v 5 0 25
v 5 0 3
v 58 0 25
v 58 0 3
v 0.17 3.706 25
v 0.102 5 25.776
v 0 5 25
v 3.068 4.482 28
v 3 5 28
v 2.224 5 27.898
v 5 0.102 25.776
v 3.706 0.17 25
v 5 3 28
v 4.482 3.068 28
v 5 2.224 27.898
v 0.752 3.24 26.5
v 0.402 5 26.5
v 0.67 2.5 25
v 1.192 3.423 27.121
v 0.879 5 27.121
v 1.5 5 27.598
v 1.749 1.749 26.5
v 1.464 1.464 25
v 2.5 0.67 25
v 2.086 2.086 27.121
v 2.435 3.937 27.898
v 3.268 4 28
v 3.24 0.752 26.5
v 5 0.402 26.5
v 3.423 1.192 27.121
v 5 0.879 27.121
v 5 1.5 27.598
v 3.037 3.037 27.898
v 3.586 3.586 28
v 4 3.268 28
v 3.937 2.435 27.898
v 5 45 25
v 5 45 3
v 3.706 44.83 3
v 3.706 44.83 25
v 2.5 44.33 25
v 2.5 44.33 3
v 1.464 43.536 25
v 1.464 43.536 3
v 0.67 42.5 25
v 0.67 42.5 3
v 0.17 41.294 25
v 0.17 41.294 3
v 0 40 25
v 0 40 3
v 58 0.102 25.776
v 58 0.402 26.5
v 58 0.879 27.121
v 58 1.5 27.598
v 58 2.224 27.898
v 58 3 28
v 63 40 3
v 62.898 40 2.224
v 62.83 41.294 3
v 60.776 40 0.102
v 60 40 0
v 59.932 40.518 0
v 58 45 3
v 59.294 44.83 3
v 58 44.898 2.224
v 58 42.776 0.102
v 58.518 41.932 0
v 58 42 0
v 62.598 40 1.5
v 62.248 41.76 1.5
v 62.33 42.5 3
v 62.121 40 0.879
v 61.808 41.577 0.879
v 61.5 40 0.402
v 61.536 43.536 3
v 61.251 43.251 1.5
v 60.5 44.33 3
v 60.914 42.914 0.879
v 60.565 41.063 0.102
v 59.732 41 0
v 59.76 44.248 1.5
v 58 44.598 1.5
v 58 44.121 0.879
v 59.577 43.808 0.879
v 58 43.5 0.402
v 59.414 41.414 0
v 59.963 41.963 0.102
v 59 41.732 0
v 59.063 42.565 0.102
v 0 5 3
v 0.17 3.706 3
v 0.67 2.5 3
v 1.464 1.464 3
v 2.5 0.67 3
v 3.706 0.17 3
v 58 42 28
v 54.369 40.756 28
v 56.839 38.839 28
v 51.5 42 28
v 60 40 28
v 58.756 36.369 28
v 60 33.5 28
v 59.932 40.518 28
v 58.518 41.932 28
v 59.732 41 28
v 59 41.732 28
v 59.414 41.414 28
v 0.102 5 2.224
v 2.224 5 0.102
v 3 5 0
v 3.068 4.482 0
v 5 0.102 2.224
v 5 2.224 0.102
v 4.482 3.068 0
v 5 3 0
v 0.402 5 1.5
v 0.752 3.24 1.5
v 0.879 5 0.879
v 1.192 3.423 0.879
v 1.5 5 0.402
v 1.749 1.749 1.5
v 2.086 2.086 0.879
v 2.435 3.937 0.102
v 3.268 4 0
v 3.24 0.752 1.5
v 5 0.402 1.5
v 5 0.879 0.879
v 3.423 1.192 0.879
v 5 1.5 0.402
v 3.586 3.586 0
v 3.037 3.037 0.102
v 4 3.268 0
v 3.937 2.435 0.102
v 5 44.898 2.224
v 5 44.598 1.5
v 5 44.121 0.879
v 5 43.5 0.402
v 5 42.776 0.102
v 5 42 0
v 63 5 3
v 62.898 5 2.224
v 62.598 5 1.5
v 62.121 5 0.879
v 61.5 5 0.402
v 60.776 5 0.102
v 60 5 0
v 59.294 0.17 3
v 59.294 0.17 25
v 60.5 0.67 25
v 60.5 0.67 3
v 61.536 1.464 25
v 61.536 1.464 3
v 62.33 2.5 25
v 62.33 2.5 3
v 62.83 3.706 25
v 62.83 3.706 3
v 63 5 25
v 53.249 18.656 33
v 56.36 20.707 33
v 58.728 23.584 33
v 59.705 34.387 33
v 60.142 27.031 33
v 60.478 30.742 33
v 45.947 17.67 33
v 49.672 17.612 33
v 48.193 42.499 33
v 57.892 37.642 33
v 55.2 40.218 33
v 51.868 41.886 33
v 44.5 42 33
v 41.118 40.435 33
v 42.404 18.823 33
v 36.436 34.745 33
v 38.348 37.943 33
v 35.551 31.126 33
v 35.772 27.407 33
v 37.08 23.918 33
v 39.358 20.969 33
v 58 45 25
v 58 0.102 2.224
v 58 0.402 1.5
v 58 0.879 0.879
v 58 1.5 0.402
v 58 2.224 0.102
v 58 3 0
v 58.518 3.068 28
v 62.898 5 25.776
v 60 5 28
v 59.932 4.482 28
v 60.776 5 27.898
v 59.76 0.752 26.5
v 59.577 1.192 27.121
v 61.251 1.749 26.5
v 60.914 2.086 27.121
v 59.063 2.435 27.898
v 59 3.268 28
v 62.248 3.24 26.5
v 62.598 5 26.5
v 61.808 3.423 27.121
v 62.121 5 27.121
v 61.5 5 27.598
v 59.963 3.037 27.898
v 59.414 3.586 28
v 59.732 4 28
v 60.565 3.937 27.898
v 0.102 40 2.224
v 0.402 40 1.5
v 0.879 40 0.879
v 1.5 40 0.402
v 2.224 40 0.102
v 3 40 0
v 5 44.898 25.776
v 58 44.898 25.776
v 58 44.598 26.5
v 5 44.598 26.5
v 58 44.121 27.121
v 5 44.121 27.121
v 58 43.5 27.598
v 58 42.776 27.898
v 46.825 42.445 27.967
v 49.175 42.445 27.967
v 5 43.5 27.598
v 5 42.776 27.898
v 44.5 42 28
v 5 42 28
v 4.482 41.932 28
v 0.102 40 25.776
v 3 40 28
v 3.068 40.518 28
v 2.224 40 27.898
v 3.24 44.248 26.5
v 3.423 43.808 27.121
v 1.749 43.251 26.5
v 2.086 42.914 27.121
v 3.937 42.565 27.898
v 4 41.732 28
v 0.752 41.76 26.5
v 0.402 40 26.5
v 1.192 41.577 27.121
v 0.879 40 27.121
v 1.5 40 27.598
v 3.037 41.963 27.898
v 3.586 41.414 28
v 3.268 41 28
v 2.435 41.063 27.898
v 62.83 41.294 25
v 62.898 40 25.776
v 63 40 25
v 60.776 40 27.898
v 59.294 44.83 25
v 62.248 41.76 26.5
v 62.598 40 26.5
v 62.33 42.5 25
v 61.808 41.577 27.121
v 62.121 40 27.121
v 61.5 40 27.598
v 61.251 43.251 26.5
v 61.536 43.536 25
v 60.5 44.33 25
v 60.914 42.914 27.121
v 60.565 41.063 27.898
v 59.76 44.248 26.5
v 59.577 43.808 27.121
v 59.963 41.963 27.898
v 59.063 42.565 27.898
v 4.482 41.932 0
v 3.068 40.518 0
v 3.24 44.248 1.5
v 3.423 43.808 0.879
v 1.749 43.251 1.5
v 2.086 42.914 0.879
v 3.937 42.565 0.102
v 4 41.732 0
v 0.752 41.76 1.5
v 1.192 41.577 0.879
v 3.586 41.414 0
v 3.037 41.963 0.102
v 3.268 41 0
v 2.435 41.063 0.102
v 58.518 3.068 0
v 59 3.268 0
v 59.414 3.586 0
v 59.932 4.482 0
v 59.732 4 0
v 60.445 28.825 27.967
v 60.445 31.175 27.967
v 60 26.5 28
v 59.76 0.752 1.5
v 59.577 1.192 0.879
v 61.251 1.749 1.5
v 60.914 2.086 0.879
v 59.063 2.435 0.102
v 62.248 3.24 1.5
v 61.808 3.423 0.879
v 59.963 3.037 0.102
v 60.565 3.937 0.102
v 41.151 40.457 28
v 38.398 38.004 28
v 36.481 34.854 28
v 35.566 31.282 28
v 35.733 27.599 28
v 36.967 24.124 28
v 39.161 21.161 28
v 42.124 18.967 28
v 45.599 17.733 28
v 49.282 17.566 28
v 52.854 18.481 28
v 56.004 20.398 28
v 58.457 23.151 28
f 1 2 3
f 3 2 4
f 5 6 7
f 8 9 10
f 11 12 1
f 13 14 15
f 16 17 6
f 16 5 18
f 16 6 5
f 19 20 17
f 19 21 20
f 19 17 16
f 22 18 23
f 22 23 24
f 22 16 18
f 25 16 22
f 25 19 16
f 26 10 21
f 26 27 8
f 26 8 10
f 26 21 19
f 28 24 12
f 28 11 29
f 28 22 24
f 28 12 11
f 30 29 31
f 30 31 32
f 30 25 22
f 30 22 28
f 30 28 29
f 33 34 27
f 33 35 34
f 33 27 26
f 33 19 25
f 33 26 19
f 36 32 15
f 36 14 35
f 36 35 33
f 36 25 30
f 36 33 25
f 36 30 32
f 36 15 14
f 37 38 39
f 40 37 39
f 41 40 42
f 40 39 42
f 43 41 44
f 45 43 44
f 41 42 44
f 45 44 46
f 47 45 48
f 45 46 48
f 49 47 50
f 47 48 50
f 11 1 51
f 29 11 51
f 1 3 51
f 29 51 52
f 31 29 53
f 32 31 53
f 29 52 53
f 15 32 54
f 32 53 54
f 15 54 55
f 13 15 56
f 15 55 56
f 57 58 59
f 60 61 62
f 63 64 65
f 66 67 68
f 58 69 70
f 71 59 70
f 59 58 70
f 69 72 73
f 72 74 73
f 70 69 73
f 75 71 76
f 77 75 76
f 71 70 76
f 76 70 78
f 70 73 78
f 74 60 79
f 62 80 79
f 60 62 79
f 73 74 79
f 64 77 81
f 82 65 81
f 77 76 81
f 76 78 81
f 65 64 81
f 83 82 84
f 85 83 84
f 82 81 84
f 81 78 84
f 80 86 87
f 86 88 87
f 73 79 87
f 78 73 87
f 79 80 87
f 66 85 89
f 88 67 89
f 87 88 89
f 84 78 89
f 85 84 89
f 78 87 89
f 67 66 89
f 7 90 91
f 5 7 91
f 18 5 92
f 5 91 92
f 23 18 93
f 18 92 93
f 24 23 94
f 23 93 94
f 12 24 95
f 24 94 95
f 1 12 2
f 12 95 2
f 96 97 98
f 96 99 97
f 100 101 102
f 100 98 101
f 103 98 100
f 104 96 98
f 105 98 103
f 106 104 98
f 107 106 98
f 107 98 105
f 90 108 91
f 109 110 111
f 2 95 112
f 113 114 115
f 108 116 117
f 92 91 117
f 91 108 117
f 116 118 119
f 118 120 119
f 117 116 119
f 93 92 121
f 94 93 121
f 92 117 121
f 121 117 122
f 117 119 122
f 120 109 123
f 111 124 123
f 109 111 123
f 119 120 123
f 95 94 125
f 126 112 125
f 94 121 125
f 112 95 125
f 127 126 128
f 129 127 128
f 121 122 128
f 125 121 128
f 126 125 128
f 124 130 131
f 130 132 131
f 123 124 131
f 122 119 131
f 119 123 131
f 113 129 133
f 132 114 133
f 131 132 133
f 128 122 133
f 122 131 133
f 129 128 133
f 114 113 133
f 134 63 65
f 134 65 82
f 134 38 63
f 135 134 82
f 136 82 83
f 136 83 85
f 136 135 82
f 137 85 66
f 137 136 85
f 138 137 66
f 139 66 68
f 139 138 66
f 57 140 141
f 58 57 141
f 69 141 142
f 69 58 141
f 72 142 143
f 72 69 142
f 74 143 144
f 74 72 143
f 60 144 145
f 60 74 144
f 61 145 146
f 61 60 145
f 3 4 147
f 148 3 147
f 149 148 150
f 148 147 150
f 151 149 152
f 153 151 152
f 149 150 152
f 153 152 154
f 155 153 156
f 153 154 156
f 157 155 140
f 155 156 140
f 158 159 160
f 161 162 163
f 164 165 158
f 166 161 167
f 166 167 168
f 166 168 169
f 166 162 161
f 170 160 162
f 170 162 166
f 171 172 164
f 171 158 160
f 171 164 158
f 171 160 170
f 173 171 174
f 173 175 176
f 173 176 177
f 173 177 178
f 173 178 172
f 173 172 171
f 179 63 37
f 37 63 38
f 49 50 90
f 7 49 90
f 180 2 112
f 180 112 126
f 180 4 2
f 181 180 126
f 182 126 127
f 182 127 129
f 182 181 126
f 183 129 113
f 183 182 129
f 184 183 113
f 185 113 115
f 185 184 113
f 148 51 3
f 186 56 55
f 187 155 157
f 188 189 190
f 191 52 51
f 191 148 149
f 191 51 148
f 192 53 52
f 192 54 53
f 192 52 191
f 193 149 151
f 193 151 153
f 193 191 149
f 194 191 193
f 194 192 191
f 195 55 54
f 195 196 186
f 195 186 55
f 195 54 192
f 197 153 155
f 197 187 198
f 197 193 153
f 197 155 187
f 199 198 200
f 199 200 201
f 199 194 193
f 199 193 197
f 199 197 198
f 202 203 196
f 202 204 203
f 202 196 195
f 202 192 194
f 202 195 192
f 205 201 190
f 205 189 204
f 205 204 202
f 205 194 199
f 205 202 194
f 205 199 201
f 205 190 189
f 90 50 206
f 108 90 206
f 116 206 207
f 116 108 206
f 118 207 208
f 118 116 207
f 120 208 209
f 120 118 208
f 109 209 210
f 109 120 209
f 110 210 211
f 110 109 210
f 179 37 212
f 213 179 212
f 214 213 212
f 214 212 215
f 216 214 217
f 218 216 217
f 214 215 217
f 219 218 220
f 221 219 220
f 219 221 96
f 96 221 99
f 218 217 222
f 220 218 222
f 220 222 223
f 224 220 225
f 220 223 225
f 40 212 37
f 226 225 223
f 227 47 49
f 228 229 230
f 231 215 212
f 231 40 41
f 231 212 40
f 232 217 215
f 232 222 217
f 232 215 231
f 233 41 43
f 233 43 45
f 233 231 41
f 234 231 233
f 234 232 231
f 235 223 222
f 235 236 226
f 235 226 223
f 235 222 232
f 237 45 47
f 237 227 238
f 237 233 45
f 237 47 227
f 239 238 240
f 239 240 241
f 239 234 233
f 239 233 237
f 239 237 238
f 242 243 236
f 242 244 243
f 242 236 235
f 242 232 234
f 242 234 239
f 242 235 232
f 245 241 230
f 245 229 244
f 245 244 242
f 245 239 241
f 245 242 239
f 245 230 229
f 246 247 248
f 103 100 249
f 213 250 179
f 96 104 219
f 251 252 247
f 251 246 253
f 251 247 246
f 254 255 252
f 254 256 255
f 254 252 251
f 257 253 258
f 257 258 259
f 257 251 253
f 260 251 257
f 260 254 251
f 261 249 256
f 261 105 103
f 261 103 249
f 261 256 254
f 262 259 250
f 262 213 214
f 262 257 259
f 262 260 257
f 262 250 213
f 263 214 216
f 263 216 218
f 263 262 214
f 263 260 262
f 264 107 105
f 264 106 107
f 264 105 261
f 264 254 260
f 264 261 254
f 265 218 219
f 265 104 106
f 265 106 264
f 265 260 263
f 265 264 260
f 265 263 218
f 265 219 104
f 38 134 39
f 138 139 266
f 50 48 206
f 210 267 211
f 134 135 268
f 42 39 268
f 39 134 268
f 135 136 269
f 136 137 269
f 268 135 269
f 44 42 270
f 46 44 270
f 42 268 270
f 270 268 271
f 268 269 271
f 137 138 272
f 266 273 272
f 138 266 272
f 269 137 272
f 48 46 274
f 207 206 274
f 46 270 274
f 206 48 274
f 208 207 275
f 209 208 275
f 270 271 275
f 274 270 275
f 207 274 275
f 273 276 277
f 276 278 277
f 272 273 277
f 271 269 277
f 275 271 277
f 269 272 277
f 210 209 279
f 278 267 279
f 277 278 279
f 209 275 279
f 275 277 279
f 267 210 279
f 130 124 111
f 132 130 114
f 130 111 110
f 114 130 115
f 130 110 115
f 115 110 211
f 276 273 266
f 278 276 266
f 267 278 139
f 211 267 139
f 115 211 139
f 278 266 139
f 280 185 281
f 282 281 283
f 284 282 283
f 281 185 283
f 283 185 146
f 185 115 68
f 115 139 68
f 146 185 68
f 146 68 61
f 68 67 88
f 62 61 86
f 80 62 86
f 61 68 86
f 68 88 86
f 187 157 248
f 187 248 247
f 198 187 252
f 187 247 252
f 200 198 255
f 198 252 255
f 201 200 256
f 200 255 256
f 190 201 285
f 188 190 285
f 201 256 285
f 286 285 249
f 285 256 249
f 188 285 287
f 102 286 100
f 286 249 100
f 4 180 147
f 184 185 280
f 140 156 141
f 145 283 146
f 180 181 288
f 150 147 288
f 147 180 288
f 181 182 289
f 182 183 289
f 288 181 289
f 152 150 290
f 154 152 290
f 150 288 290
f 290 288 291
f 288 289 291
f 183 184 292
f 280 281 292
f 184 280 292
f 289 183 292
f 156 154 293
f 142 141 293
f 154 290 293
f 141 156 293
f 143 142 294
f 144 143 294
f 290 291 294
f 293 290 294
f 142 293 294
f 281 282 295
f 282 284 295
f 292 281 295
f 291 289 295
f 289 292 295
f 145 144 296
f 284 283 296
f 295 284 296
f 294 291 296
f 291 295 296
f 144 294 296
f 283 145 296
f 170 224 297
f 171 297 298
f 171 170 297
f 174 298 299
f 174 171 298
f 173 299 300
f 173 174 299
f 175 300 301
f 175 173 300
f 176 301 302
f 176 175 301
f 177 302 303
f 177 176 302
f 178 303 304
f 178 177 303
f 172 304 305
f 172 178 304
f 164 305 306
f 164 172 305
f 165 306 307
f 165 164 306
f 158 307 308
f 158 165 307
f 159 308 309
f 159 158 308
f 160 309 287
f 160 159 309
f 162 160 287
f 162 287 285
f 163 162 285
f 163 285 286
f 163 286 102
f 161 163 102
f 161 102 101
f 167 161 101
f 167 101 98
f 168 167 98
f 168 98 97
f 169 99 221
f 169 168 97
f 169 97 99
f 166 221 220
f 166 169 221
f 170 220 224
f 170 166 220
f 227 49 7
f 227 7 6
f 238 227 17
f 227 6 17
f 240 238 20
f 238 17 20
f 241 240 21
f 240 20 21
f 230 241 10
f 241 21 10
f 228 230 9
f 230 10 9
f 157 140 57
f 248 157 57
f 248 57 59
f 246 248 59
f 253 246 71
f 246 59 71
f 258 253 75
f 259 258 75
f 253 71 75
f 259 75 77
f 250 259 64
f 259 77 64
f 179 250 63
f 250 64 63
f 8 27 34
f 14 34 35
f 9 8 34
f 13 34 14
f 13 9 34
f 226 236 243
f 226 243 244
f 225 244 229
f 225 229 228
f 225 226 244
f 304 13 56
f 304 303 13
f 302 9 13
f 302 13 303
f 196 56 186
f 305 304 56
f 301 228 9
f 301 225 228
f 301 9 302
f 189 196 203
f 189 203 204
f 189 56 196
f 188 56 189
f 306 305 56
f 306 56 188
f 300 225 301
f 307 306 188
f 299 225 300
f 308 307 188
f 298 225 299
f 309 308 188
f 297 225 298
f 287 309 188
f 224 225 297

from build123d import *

# Parameters (mm, degrees)
BOSS_EXTRUDE1_DEPTH = 28
FILLET1_R           = 3
SKETCH4_R           = 12.5
BOSS_EXTRUDE3_DEPTH = 5


with BuildPart() as part:
    # Sketch3 → Boss-Extrude1 (new body)
    with BuildSketch(Plane.XY):
        with BuildLine():
            Line((5, 0), (58, 0))
            ThreePointArc((58, 0), (61.535533906, 1.464466094), (63, 5))
            Line((63, 5), (63, 40))
            ThreePointArc((63, 40), (61.535533906, 43.535533906), (58, 45))
            Line((58, 45), (5, 45))
            ThreePointArc((5, 45), (1.464466094, 43.535533906), (0, 40))
            Line((0, 40), (0, 5))
            ThreePointArc((0, 5), (1.464466094, 1.464466094), (5, 0))
        make_face()
    extrude(amount=BOSS_EXTRUDE1_DEPTH)

    # Fillet1
    fillet1_edges = [part.edges().sort_by_distance(p)[0] for p in [
        (63, 22.5, 0),
        (61.535533906, 1.464466094, 0),
        (31.5, 0, 0),
        (1.464466094, 1.464466094, 0),
        (61.535533906, 1.464466094, 28),
        (63, 22.5, 28),
        (61.535533906, 43.535533906, 28),
        (31.5, 45, 28),
        (1.464466094, 43.535533906, 28),
        (0, 22.5, 28),
        (1.464466094, 1.464466094, 28),
        (0, 22.5, 0),
        (31.5, 0, 28),
        (1.464466094, 43.535533906, 0),
        (31.5, 45, 0),
        (61.535533906, 43.535533906, 0),
    ]]
    fillet(fillet1_edges, radius=FILLET1_R)

    # Sketch4 → Boss-Extrude3 (add, symmetric)
    with BuildSketch(Plane.XY.offset(28)):
        with Locations(Location((48, 30, 0), (0, 0, 106.260204708))):
            Circle(SKETCH4_R)
    extrude(amount=BOSS_EXTRUDE3_DEPTH, both=True)


solid = part.part
